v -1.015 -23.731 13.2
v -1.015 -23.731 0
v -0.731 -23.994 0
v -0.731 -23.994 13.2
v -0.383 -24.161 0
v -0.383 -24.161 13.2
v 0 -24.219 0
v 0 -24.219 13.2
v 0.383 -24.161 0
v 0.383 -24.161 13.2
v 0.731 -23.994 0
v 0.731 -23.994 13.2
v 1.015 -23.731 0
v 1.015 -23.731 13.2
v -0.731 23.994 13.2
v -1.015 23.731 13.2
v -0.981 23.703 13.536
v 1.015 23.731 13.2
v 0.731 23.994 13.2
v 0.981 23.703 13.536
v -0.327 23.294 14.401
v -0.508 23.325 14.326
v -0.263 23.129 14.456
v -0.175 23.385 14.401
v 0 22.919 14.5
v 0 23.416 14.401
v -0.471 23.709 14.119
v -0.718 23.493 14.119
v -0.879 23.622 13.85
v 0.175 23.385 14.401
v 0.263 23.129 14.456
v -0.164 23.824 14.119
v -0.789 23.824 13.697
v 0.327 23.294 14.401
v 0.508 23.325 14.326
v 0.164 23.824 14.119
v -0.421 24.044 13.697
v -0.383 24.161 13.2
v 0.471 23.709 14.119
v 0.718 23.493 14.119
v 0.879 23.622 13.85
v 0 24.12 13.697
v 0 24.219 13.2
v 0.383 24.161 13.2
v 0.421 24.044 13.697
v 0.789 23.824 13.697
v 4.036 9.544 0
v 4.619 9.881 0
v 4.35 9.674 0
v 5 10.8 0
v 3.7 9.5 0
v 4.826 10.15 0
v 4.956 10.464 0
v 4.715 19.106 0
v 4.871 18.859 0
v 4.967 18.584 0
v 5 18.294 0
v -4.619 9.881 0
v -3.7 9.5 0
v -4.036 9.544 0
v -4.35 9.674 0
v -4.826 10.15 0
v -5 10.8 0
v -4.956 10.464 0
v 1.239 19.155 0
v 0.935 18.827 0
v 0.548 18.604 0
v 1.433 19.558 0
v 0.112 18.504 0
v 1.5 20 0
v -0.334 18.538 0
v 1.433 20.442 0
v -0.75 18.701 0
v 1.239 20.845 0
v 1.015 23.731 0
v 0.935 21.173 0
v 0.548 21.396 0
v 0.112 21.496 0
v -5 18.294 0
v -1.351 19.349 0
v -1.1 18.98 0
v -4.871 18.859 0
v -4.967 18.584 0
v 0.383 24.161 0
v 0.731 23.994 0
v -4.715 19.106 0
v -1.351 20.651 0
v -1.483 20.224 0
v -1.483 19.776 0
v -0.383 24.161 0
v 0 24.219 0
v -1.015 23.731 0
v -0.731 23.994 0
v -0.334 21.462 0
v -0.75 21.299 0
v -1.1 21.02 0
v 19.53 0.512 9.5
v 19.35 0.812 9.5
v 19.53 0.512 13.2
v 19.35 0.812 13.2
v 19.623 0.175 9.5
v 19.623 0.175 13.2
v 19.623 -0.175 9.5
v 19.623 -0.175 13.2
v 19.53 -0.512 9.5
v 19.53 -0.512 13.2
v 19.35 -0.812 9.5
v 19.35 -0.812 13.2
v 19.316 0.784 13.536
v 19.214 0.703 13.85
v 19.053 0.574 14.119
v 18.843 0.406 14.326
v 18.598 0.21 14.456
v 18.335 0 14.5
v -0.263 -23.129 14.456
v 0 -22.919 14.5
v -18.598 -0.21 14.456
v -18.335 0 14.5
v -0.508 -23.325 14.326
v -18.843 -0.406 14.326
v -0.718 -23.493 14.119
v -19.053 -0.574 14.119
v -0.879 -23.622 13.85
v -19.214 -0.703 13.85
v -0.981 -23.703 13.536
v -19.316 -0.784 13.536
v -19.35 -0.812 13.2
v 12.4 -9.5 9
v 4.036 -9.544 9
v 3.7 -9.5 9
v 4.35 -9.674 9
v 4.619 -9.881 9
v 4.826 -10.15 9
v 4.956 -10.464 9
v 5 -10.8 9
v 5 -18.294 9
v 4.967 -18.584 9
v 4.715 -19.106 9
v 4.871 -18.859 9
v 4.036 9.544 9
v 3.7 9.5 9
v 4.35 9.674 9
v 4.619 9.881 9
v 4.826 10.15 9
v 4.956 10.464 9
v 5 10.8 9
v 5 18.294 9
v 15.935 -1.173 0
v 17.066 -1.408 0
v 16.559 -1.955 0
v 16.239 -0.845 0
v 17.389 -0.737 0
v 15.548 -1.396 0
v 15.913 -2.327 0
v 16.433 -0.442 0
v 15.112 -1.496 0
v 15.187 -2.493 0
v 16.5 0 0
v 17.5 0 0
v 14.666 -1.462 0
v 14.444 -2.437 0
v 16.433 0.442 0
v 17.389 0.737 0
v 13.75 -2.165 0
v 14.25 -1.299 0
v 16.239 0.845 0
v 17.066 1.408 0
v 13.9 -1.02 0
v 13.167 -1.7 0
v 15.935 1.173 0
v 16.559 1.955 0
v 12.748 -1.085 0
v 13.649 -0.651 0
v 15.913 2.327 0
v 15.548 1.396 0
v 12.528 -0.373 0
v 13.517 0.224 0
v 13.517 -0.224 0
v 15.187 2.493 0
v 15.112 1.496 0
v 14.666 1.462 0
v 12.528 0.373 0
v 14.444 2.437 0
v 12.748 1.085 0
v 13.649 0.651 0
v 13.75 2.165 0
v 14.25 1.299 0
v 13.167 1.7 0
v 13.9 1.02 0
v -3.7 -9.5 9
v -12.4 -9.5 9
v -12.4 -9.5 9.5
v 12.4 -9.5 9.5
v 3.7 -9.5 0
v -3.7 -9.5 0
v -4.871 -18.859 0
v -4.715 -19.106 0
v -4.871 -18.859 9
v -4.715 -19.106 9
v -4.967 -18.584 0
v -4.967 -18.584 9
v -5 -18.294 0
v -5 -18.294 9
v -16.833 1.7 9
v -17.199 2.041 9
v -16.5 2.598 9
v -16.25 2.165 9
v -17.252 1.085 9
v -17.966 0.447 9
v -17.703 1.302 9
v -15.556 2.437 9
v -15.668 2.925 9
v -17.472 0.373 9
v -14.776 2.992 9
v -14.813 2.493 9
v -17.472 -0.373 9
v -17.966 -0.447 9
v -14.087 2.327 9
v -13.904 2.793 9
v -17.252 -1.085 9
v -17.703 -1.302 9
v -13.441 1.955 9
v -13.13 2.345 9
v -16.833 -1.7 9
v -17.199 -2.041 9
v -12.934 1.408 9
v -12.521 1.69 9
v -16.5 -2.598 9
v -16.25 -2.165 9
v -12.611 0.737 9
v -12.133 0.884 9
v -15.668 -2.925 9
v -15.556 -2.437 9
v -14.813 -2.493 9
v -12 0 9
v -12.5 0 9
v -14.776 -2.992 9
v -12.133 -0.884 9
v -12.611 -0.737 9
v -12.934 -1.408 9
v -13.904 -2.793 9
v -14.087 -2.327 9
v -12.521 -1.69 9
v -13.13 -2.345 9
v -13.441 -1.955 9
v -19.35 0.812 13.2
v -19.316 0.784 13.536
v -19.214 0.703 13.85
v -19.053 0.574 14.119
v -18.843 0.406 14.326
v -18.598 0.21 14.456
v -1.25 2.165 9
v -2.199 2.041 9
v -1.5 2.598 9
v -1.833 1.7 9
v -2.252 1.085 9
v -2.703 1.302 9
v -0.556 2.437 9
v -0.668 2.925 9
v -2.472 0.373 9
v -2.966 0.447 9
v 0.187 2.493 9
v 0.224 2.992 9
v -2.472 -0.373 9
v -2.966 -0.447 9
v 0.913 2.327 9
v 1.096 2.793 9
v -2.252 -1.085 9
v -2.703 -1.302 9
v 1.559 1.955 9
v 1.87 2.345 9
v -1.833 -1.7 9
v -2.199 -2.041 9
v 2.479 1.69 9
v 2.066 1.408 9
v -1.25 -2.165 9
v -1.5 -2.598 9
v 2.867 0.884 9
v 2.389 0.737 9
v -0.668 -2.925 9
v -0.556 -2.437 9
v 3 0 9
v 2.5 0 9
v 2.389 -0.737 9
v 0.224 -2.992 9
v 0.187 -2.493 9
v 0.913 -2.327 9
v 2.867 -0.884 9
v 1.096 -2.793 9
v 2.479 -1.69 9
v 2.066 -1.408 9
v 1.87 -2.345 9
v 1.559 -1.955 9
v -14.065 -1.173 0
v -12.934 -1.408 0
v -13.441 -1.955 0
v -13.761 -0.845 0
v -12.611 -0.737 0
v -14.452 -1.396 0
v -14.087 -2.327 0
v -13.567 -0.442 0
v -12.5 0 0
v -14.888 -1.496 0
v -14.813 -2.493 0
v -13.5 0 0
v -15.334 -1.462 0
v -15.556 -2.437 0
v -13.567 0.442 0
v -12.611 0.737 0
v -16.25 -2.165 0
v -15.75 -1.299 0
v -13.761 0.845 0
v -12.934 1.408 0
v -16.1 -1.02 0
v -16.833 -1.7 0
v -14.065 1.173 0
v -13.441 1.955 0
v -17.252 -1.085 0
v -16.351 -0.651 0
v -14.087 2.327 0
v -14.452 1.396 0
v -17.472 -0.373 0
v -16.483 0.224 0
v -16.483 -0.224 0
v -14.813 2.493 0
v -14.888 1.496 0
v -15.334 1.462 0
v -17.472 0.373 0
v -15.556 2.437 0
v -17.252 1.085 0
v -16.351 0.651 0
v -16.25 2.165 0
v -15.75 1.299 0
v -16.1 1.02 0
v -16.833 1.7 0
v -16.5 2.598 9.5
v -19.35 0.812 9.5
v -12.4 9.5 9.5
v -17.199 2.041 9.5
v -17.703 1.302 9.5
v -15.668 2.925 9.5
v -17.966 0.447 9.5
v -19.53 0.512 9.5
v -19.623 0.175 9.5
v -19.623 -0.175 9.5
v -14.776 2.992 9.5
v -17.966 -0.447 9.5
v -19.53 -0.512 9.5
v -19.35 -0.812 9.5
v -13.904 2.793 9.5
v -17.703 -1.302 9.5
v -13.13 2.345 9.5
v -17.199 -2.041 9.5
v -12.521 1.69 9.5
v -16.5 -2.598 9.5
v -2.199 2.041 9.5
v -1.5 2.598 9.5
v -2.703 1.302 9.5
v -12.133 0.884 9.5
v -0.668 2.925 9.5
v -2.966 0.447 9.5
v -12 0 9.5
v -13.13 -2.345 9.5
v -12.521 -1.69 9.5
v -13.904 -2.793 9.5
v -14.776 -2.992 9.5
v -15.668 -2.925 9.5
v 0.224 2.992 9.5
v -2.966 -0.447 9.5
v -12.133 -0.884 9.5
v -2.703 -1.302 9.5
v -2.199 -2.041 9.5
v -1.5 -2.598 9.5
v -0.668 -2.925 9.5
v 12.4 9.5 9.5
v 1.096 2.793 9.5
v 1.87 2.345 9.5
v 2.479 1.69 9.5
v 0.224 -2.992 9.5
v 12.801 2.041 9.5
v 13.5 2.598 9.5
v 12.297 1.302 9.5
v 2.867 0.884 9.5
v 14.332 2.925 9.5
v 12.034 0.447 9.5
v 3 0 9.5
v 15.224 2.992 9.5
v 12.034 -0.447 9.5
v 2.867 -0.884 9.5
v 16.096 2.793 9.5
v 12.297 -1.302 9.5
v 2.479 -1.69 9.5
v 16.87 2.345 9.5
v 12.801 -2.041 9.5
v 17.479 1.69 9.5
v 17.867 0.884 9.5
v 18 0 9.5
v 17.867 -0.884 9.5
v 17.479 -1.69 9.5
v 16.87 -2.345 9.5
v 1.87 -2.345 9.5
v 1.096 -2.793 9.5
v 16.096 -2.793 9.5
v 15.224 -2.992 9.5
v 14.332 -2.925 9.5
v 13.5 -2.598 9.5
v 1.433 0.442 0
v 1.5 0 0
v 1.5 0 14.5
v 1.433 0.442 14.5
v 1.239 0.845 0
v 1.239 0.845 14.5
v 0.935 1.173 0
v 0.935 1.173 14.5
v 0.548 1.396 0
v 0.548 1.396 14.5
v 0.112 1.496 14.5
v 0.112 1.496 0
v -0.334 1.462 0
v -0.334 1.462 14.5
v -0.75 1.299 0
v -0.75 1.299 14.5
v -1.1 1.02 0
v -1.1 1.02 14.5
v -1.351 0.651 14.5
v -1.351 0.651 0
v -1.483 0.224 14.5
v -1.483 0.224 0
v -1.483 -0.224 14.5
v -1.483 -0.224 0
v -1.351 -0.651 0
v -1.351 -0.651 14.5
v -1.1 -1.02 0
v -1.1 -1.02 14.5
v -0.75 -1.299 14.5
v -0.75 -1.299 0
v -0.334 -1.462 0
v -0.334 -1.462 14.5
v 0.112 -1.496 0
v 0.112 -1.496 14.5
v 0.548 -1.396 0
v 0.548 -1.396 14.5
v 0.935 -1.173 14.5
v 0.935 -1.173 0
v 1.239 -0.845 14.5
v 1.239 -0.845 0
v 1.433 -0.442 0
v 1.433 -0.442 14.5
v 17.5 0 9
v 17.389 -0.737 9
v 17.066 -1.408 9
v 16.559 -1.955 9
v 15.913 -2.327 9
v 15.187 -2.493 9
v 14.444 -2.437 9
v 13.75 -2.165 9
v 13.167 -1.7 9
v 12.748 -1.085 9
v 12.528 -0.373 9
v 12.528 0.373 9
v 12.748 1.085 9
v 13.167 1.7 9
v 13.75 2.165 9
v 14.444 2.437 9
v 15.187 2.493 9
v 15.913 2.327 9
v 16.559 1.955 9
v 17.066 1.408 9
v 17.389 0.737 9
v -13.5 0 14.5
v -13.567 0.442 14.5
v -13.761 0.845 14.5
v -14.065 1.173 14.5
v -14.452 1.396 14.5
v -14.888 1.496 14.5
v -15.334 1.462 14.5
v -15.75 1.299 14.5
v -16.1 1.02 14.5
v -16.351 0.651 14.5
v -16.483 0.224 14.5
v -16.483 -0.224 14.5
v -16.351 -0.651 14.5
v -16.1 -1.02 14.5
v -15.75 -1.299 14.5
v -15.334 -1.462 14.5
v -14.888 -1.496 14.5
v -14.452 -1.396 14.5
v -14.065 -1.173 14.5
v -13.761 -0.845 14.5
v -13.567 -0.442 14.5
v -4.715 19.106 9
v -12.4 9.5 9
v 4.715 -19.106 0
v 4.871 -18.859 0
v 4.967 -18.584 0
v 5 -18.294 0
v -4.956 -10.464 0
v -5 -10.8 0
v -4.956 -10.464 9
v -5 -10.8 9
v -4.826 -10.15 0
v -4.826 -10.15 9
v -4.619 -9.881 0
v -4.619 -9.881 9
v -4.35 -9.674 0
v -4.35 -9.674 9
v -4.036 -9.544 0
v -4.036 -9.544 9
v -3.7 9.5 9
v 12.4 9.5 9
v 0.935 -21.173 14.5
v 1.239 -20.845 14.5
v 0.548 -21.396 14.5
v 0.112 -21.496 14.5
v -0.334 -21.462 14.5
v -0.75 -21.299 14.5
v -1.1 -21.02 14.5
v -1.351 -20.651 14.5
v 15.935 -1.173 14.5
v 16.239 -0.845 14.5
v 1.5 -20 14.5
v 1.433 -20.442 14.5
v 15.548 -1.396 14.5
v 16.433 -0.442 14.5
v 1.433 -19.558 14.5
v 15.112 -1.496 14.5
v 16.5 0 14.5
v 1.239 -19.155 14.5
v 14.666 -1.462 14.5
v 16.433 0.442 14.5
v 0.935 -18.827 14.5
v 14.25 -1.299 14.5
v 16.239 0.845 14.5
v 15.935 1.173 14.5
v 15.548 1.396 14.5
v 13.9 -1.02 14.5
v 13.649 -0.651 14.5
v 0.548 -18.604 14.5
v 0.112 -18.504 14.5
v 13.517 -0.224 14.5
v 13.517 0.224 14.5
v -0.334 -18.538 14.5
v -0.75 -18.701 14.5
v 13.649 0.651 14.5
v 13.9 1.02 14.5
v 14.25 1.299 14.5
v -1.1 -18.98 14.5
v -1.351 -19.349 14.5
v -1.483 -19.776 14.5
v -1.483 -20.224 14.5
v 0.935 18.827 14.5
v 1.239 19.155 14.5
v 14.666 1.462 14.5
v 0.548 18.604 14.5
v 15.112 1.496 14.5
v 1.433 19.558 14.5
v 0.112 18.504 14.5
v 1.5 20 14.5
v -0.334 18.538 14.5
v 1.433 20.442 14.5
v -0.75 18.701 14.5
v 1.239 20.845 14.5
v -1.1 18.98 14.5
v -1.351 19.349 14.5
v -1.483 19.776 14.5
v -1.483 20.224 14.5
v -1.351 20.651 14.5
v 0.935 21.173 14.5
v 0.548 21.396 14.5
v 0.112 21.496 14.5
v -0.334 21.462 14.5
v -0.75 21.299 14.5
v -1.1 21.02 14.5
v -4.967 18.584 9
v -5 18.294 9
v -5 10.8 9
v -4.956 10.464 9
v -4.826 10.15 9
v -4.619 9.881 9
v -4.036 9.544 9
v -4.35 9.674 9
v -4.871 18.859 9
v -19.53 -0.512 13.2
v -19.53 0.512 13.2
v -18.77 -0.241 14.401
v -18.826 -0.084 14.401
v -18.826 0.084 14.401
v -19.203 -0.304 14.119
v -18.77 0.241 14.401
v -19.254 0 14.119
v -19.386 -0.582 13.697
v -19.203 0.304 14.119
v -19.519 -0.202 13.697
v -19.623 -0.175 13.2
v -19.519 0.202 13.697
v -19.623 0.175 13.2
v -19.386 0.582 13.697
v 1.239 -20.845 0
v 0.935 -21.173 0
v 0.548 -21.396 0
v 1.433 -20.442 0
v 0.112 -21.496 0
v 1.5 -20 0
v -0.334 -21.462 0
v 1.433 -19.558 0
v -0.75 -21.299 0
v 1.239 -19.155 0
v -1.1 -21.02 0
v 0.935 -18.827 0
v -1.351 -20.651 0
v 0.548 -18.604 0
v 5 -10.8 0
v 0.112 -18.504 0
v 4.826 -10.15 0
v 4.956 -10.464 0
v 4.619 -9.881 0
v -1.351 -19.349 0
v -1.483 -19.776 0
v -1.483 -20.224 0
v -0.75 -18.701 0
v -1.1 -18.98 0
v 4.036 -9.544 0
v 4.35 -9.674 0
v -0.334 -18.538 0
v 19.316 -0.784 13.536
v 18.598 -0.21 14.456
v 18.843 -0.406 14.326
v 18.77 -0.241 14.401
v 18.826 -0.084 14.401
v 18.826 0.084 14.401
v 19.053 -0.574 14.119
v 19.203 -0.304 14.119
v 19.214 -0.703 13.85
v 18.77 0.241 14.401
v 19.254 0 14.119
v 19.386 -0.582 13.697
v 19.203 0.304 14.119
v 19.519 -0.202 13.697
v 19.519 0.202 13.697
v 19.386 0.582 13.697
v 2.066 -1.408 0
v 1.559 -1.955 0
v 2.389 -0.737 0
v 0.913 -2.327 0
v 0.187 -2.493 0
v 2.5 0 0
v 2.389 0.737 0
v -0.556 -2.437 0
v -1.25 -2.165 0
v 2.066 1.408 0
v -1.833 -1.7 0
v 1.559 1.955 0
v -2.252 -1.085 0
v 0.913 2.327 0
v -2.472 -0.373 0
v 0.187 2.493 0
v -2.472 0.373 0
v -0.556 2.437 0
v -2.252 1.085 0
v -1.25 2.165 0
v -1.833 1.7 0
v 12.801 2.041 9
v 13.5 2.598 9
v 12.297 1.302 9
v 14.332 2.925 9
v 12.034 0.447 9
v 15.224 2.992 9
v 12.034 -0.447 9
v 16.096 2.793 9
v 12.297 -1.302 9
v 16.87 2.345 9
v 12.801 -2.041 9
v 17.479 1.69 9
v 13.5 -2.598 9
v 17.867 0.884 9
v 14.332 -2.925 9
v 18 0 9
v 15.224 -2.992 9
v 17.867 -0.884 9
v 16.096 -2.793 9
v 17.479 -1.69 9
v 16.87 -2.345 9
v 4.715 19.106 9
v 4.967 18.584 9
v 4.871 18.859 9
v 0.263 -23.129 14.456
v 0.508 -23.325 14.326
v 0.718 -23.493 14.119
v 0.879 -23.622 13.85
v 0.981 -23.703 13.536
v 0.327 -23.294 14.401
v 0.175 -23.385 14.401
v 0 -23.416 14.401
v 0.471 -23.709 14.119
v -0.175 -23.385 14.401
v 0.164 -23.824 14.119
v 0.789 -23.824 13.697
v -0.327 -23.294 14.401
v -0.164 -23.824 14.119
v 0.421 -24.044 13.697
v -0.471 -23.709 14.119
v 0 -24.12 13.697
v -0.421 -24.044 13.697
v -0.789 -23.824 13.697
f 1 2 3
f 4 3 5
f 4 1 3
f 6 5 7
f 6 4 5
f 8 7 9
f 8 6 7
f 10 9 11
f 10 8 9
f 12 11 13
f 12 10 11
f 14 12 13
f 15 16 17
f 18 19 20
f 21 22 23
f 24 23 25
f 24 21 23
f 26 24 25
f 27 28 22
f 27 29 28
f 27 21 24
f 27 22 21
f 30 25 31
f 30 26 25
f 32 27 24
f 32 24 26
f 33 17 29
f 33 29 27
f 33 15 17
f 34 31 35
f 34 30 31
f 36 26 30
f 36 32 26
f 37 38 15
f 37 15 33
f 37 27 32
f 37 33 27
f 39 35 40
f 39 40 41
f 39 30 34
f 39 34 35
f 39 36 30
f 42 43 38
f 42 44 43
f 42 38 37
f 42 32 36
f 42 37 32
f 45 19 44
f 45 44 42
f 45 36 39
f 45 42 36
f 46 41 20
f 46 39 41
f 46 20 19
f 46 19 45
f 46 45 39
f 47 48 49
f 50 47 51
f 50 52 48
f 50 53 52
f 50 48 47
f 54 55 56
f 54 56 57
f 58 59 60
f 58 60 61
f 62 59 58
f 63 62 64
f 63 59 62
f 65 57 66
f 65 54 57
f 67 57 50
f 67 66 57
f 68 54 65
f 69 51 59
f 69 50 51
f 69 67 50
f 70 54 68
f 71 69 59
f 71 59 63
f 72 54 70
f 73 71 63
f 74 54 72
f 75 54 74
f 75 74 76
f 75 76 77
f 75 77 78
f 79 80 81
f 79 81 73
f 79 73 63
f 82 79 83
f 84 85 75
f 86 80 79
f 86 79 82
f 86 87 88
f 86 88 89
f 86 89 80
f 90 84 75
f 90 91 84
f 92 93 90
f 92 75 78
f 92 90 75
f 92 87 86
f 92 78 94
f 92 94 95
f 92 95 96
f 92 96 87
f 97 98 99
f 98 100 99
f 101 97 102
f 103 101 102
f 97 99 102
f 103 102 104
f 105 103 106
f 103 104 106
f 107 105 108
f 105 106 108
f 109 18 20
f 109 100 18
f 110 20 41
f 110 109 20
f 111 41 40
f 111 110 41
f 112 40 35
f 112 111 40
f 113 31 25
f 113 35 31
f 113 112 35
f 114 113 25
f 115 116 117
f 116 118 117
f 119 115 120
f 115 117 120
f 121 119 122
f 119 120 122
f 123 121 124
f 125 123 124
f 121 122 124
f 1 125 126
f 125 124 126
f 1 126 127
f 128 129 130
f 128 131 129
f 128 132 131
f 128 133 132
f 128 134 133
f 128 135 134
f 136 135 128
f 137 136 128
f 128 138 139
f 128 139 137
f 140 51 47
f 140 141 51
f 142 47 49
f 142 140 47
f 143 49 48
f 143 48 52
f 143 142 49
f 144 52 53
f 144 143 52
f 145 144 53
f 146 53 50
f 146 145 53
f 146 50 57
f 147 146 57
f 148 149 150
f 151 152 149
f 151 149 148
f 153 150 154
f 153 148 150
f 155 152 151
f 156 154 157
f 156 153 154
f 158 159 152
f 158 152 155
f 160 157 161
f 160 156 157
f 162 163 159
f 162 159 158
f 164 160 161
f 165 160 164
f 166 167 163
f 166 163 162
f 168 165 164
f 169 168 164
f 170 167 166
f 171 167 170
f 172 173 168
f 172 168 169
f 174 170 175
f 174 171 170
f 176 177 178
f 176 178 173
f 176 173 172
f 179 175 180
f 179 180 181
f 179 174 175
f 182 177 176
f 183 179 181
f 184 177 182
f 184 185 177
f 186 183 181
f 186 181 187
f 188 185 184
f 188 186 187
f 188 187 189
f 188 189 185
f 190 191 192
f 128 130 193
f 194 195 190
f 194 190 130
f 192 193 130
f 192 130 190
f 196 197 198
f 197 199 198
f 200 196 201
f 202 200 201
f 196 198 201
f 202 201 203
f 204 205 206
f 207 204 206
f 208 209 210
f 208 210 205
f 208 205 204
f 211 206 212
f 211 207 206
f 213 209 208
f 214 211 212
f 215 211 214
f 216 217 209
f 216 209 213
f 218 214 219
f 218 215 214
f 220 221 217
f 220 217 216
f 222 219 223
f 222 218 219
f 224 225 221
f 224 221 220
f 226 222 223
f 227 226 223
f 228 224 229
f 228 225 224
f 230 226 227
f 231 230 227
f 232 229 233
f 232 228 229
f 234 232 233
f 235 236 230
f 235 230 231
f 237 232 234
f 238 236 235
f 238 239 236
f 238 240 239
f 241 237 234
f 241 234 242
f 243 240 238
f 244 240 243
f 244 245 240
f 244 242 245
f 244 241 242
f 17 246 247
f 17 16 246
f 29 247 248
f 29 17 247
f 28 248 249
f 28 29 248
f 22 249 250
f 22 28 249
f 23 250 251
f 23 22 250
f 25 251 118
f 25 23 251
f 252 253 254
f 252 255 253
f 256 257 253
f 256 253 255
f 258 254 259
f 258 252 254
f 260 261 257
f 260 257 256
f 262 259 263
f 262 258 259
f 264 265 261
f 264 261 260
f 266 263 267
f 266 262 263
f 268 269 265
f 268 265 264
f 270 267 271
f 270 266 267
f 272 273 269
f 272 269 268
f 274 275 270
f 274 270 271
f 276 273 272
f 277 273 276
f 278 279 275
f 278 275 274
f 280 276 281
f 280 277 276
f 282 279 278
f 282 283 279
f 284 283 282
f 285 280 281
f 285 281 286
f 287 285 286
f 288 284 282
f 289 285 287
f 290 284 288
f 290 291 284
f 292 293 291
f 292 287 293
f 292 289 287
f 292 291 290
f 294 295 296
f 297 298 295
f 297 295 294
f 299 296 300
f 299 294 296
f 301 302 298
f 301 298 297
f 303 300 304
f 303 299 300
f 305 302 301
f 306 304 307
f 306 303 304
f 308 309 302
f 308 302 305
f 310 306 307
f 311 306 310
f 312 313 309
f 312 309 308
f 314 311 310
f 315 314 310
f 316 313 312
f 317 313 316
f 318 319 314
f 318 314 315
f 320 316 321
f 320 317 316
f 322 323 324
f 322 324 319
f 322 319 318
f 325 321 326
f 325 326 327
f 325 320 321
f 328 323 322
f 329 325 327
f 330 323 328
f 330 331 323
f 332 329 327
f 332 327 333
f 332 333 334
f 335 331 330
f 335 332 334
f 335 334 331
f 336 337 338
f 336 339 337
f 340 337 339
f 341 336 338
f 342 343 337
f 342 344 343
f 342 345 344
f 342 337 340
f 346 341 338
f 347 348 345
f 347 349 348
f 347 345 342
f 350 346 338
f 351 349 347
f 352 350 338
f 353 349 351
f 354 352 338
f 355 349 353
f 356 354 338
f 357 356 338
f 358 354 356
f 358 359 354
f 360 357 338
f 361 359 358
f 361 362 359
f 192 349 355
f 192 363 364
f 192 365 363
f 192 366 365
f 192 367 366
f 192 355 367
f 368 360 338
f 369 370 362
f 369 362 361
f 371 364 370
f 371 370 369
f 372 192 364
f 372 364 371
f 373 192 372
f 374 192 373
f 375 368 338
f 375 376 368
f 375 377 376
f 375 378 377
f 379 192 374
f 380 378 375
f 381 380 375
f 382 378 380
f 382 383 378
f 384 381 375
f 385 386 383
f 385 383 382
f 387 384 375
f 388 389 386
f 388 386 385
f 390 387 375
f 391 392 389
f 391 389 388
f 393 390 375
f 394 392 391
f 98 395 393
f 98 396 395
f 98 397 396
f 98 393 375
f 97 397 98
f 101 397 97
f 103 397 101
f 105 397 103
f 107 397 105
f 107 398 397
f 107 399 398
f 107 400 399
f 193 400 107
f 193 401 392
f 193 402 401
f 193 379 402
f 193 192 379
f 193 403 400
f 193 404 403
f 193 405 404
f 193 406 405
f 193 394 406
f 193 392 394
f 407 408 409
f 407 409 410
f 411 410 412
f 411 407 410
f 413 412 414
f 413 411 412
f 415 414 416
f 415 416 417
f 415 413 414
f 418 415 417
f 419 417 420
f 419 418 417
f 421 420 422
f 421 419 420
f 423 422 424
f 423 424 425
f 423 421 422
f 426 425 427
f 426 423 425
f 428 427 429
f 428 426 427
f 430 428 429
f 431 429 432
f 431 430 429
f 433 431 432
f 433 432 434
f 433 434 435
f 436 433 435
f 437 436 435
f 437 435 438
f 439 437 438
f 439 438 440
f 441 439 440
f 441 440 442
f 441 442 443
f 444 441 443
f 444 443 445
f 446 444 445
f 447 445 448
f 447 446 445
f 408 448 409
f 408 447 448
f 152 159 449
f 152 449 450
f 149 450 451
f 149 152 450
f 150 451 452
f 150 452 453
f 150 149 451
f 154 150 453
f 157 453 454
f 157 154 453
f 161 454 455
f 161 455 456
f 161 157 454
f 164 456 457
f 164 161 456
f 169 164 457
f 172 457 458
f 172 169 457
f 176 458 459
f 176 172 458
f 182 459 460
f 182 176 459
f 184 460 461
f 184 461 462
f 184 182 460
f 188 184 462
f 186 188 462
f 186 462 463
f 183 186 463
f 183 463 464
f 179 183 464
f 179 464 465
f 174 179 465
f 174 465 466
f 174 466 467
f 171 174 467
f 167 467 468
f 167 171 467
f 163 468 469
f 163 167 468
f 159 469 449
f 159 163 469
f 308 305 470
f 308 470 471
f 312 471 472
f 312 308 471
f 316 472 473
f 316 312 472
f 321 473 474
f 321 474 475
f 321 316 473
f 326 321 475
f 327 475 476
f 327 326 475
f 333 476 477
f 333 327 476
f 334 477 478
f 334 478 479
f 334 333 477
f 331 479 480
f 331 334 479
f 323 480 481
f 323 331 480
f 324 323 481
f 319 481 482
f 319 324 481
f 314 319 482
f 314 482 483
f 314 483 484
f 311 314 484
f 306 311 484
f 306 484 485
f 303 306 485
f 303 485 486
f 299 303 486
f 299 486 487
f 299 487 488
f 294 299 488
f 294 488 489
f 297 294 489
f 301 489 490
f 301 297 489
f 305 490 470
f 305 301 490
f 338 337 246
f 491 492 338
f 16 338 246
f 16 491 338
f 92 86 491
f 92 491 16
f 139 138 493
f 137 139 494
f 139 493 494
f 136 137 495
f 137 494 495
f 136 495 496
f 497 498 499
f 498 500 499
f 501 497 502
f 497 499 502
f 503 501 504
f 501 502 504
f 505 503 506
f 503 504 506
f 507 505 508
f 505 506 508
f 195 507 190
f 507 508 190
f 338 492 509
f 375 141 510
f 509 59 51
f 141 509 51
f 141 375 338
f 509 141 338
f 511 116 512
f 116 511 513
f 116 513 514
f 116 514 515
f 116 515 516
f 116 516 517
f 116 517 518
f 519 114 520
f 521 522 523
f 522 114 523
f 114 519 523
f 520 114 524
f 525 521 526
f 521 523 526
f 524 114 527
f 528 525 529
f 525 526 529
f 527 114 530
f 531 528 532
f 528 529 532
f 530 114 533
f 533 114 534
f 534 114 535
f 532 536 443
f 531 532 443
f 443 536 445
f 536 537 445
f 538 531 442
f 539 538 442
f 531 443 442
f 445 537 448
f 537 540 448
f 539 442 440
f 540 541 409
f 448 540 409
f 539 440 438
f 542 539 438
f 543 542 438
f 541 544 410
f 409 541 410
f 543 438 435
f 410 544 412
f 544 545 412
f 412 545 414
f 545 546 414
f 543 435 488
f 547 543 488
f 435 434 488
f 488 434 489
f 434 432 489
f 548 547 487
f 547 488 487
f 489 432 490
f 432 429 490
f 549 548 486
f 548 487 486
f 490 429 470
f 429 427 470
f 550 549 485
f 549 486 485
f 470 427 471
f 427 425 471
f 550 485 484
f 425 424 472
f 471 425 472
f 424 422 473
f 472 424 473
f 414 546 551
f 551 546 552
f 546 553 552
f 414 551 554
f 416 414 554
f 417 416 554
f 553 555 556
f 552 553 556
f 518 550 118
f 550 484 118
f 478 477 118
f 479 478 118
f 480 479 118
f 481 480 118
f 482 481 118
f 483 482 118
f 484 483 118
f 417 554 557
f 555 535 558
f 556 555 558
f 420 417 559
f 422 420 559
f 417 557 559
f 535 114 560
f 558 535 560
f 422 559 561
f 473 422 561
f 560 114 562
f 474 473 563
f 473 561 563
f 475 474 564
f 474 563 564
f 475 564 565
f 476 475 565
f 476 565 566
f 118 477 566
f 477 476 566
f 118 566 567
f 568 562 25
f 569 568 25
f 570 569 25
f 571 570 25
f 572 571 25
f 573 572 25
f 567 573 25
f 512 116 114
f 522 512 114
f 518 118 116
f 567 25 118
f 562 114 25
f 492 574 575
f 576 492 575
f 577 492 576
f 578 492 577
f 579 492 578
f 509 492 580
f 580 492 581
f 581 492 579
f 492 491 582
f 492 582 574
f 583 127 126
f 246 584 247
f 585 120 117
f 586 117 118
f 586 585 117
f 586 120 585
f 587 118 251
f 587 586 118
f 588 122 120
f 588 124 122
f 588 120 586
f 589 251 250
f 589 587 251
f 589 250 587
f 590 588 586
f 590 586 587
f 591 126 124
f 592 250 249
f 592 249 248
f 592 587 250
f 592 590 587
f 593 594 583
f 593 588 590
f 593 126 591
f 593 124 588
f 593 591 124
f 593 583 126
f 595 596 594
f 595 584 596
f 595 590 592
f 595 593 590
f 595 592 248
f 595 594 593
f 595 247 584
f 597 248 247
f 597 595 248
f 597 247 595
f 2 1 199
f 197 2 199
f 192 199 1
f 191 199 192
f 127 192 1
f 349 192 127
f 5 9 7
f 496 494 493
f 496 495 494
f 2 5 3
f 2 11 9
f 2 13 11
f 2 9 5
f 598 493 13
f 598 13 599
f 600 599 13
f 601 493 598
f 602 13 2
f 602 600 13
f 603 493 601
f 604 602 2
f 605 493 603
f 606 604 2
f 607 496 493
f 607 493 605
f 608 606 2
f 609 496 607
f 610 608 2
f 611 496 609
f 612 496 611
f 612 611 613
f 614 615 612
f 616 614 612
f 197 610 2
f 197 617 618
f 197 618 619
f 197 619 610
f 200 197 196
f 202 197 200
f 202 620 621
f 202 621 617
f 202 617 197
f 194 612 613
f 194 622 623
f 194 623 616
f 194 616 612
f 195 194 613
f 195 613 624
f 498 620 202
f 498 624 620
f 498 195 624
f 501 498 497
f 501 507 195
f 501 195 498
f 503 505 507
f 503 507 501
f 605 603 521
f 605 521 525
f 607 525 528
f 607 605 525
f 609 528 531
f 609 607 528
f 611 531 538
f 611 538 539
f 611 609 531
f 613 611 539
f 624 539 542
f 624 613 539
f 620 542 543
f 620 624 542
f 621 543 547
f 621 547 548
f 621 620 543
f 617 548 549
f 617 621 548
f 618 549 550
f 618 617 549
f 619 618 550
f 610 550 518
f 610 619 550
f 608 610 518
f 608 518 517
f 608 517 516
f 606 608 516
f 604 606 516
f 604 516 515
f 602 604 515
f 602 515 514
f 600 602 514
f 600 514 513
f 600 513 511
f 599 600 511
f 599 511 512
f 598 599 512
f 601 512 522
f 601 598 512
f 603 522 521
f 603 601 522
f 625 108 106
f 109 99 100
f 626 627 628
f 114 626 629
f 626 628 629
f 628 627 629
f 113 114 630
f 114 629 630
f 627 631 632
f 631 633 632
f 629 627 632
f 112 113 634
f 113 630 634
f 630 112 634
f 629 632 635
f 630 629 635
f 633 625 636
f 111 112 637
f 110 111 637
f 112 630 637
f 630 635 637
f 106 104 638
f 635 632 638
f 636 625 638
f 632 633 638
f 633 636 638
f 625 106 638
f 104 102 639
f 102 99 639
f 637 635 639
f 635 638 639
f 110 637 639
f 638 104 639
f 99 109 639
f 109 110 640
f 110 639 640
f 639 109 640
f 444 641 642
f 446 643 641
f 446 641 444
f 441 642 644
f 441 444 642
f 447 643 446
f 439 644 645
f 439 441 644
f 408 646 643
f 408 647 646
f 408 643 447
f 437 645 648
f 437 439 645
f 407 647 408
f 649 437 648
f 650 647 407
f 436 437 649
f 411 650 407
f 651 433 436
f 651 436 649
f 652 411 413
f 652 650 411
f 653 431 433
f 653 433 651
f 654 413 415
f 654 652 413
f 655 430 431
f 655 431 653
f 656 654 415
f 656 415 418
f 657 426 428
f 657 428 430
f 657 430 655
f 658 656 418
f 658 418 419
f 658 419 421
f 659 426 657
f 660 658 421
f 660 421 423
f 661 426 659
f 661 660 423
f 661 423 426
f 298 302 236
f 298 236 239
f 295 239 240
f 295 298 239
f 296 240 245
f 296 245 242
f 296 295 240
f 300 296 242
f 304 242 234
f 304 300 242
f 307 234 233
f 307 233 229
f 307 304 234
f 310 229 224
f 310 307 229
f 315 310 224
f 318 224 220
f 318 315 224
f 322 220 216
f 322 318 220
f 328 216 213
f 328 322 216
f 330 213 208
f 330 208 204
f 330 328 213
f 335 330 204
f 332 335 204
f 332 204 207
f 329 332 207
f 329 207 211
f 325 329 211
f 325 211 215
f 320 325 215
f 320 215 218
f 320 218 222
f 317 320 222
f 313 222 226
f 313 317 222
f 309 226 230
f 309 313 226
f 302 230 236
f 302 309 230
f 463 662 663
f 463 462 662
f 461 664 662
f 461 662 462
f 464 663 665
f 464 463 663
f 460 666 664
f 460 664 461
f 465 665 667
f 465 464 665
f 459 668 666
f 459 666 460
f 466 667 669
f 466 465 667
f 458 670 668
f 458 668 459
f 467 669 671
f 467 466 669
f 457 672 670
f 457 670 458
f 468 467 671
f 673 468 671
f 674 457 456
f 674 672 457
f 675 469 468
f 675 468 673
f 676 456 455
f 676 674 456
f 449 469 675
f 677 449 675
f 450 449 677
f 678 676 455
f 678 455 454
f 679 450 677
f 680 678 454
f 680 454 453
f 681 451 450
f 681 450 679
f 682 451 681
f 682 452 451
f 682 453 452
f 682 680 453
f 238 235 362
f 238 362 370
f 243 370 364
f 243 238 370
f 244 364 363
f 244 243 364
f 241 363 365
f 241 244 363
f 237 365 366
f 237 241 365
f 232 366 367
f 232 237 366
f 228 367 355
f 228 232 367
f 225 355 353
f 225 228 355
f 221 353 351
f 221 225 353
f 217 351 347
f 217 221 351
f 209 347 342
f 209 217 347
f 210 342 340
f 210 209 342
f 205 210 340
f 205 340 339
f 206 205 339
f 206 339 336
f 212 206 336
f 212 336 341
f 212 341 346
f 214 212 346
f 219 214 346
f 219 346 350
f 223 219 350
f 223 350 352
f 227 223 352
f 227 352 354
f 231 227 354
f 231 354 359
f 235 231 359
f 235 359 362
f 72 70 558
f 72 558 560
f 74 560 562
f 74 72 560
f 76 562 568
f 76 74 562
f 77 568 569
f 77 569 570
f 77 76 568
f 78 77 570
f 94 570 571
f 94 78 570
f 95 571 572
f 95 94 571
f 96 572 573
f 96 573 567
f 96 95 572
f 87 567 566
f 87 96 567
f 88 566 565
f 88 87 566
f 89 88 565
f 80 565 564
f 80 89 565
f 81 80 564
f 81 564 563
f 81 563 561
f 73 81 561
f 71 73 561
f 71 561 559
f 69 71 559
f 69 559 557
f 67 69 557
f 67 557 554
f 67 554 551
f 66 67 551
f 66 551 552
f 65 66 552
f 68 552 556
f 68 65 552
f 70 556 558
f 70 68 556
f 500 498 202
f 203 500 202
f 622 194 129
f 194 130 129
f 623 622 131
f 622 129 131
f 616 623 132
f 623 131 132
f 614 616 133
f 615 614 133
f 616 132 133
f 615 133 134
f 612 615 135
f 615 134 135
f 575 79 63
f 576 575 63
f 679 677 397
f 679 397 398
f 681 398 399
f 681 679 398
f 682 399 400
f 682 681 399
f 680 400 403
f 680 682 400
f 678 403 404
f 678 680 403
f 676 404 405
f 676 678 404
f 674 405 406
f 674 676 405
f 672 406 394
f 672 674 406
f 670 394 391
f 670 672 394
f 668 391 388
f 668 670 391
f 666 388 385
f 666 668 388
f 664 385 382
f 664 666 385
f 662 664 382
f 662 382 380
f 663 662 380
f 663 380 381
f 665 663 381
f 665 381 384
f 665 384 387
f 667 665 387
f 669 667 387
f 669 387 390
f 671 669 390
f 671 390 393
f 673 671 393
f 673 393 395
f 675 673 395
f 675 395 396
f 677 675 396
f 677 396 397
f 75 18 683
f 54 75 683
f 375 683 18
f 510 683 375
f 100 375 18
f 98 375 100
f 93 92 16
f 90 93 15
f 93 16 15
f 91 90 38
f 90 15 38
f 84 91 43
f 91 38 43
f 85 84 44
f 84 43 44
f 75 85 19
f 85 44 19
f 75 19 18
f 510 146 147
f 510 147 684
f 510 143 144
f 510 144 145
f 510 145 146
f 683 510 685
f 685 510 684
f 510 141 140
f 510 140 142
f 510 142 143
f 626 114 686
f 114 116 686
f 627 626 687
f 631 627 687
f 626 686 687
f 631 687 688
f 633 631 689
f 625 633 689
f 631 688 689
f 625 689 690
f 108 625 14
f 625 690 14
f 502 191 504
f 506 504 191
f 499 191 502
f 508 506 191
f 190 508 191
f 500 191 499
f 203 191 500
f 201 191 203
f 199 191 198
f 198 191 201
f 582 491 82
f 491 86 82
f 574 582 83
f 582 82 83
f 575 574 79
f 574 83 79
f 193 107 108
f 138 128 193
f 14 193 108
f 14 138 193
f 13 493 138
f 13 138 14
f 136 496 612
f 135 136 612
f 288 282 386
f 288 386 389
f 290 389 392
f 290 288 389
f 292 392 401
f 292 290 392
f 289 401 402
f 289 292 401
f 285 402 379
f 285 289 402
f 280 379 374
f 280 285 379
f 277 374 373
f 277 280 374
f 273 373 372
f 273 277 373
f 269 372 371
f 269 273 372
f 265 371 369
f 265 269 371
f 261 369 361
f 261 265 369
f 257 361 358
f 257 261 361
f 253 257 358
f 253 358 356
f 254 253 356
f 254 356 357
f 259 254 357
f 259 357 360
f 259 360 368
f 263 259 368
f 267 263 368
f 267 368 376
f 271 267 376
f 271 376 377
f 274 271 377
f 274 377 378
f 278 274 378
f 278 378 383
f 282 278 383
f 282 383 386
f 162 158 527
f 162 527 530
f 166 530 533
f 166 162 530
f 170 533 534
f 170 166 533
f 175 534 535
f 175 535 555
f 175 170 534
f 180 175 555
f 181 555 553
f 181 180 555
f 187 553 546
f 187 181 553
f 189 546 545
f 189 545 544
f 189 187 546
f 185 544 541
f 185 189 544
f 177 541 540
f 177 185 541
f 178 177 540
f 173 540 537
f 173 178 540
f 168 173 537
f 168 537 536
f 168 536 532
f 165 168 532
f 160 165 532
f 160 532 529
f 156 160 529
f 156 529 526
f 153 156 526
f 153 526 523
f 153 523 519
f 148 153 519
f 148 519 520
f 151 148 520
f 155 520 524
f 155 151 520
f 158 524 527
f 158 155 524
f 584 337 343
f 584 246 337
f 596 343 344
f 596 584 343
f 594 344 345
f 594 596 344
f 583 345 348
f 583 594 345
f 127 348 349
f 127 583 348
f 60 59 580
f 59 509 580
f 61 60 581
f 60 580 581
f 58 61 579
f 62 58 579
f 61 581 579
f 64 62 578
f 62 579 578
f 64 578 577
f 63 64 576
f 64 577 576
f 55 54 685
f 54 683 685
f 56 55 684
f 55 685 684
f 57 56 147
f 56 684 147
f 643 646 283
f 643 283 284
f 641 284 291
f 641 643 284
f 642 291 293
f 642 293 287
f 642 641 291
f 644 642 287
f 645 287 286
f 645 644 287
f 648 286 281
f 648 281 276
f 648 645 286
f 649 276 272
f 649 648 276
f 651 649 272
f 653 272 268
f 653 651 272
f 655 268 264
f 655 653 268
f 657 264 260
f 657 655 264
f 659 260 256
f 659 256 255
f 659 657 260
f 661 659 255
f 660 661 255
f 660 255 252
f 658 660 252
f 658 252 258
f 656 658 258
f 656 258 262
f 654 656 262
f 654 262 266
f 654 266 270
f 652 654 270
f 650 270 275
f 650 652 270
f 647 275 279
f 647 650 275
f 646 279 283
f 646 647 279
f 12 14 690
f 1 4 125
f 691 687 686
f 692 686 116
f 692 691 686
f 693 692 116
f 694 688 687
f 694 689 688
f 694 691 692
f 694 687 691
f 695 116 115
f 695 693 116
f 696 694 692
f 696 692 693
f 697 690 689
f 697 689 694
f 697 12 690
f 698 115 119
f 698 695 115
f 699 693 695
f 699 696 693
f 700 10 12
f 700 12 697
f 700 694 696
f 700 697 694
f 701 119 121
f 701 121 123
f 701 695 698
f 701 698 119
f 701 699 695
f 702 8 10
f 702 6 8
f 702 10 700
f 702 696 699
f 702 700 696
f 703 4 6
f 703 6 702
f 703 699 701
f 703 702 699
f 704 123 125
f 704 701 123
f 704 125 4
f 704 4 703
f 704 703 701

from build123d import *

# Parameters (mm, degrees)
SKETCH_R        = 1.5
PAD_DEPTH       = 14.5
SKETCH001_R     = 3
POCKET_DEPTH    = 9.5
SKETCH002_R     = 2.5
POCKET001_DEPTH = 9
FILLET_R        = 1.3


with BuildPart() as part:
    # Sketch → Pad (new body)
    with BuildSketch(Plane.XY):
        Polygon((-20, 0), (0, 25), (20, 0), (0, -25), align=None)
        with Locations((0, 20)):
            Circle(SKETCH_R, mode=Mode.SUBTRACT)
        with Locations((0, -20)):
            Circle(SKETCH_R, mode=Mode.SUBTRACT)
        with Locations((-15, 0)):
            Circle(SKETCH_R, mode=Mode.SUBTRACT)
        Circle(SKETCH_R, mode=Mode.SUBTRACT)
        with Locations((15, 0)):
            Circle(SKETCH_R, mode=Mode.SUBTRACT)
    extrude(amount=PAD_DEPTH)

    # Sketch001 (on Face10 of Pad) → Pocket (cut)
    with BuildSketch(Plane(origin=(0, 0, 0), x_dir=(1, 0, 0), z_dir=(0, 0, -1))):
        with BuildLine():
            ThreePointArc((-15, 9.5), (-24.5, 0), (-15, -9.5))
            Line((-15, -9.5), (15, -9.5))
            ThreePointArc((15, -9.5), (24.5, 0), (15, 9.5))
            Line((-15, 9.5), (15, 9.5))
        make_face()
        with Locations((-15, 0)):
            Circle(SKETCH001_R, mode=Mode.SUBTRACT)
        Circle(SKETCH001_R, mode=Mode.SUBTRACT)
        with Locations((15, 0)):
            Circle(SKETCH001_R, mode=Mode.SUBTRACT)
    extrude(amount=-POCKET_DEPTH, mode=Mode.SUBTRACT)

    # Sketch002 (on Face20 of Pocket) → Pocket001 (cut)
    with BuildSketch(Plane(origin=(0, 0, 0), x_dir=(1, 0, 0), z_dir=(0, 0, -1))):
        Polygon((-20, 25), (-20, -25), (-5, -25), (-5, -9.5), (5, -9.5), (5, -25), (20, -25), (20, 25), (5, 25), (5, 9.5), (-5, 9.5), (-5, 25), align=None)
        Circle(SKETCH002_R, mode=Mode.SUBTRACT)
        with Locations((-15, 0)):
            Circle(SKETCH002_R, mode=Mode.SUBTRACT)
        with Locations((15, 0)):
            Circle(SKETCH002_R, mode=Mode.SUBTRACT)
    extrude(amount=-POCKET001_DEPTH, mode=Mode.SUBTRACT)

    # Fillet
    fillet_edges = [part.edges().sort_by_distance(p)[0] for p in [
        (10, -12.5, 14.5),
        (-10, -12.5, 14.5),
        (-10, 12.5, 14.5),
        (10, 12.5, 14.5),
        (0, -25, 7.25),
        (5, -18.75, 4.5),
        (-5, -18.75, 4.5),
        (20, 0, 12),
        (-20, 0, 12),
        (-5, 18.75, 4.5),
        (0, 25, 7.25),
        (5, 18.75, 4.5),
        (-5, -9.5, 4.5),
        (5, -9.5, 4.5),
        (5, 9.5, 4.5),
        (-5, 9.5, 4.5),
    ]]
    fillet(fillet_edges, radius=FILLET_R)


solid = part.part
